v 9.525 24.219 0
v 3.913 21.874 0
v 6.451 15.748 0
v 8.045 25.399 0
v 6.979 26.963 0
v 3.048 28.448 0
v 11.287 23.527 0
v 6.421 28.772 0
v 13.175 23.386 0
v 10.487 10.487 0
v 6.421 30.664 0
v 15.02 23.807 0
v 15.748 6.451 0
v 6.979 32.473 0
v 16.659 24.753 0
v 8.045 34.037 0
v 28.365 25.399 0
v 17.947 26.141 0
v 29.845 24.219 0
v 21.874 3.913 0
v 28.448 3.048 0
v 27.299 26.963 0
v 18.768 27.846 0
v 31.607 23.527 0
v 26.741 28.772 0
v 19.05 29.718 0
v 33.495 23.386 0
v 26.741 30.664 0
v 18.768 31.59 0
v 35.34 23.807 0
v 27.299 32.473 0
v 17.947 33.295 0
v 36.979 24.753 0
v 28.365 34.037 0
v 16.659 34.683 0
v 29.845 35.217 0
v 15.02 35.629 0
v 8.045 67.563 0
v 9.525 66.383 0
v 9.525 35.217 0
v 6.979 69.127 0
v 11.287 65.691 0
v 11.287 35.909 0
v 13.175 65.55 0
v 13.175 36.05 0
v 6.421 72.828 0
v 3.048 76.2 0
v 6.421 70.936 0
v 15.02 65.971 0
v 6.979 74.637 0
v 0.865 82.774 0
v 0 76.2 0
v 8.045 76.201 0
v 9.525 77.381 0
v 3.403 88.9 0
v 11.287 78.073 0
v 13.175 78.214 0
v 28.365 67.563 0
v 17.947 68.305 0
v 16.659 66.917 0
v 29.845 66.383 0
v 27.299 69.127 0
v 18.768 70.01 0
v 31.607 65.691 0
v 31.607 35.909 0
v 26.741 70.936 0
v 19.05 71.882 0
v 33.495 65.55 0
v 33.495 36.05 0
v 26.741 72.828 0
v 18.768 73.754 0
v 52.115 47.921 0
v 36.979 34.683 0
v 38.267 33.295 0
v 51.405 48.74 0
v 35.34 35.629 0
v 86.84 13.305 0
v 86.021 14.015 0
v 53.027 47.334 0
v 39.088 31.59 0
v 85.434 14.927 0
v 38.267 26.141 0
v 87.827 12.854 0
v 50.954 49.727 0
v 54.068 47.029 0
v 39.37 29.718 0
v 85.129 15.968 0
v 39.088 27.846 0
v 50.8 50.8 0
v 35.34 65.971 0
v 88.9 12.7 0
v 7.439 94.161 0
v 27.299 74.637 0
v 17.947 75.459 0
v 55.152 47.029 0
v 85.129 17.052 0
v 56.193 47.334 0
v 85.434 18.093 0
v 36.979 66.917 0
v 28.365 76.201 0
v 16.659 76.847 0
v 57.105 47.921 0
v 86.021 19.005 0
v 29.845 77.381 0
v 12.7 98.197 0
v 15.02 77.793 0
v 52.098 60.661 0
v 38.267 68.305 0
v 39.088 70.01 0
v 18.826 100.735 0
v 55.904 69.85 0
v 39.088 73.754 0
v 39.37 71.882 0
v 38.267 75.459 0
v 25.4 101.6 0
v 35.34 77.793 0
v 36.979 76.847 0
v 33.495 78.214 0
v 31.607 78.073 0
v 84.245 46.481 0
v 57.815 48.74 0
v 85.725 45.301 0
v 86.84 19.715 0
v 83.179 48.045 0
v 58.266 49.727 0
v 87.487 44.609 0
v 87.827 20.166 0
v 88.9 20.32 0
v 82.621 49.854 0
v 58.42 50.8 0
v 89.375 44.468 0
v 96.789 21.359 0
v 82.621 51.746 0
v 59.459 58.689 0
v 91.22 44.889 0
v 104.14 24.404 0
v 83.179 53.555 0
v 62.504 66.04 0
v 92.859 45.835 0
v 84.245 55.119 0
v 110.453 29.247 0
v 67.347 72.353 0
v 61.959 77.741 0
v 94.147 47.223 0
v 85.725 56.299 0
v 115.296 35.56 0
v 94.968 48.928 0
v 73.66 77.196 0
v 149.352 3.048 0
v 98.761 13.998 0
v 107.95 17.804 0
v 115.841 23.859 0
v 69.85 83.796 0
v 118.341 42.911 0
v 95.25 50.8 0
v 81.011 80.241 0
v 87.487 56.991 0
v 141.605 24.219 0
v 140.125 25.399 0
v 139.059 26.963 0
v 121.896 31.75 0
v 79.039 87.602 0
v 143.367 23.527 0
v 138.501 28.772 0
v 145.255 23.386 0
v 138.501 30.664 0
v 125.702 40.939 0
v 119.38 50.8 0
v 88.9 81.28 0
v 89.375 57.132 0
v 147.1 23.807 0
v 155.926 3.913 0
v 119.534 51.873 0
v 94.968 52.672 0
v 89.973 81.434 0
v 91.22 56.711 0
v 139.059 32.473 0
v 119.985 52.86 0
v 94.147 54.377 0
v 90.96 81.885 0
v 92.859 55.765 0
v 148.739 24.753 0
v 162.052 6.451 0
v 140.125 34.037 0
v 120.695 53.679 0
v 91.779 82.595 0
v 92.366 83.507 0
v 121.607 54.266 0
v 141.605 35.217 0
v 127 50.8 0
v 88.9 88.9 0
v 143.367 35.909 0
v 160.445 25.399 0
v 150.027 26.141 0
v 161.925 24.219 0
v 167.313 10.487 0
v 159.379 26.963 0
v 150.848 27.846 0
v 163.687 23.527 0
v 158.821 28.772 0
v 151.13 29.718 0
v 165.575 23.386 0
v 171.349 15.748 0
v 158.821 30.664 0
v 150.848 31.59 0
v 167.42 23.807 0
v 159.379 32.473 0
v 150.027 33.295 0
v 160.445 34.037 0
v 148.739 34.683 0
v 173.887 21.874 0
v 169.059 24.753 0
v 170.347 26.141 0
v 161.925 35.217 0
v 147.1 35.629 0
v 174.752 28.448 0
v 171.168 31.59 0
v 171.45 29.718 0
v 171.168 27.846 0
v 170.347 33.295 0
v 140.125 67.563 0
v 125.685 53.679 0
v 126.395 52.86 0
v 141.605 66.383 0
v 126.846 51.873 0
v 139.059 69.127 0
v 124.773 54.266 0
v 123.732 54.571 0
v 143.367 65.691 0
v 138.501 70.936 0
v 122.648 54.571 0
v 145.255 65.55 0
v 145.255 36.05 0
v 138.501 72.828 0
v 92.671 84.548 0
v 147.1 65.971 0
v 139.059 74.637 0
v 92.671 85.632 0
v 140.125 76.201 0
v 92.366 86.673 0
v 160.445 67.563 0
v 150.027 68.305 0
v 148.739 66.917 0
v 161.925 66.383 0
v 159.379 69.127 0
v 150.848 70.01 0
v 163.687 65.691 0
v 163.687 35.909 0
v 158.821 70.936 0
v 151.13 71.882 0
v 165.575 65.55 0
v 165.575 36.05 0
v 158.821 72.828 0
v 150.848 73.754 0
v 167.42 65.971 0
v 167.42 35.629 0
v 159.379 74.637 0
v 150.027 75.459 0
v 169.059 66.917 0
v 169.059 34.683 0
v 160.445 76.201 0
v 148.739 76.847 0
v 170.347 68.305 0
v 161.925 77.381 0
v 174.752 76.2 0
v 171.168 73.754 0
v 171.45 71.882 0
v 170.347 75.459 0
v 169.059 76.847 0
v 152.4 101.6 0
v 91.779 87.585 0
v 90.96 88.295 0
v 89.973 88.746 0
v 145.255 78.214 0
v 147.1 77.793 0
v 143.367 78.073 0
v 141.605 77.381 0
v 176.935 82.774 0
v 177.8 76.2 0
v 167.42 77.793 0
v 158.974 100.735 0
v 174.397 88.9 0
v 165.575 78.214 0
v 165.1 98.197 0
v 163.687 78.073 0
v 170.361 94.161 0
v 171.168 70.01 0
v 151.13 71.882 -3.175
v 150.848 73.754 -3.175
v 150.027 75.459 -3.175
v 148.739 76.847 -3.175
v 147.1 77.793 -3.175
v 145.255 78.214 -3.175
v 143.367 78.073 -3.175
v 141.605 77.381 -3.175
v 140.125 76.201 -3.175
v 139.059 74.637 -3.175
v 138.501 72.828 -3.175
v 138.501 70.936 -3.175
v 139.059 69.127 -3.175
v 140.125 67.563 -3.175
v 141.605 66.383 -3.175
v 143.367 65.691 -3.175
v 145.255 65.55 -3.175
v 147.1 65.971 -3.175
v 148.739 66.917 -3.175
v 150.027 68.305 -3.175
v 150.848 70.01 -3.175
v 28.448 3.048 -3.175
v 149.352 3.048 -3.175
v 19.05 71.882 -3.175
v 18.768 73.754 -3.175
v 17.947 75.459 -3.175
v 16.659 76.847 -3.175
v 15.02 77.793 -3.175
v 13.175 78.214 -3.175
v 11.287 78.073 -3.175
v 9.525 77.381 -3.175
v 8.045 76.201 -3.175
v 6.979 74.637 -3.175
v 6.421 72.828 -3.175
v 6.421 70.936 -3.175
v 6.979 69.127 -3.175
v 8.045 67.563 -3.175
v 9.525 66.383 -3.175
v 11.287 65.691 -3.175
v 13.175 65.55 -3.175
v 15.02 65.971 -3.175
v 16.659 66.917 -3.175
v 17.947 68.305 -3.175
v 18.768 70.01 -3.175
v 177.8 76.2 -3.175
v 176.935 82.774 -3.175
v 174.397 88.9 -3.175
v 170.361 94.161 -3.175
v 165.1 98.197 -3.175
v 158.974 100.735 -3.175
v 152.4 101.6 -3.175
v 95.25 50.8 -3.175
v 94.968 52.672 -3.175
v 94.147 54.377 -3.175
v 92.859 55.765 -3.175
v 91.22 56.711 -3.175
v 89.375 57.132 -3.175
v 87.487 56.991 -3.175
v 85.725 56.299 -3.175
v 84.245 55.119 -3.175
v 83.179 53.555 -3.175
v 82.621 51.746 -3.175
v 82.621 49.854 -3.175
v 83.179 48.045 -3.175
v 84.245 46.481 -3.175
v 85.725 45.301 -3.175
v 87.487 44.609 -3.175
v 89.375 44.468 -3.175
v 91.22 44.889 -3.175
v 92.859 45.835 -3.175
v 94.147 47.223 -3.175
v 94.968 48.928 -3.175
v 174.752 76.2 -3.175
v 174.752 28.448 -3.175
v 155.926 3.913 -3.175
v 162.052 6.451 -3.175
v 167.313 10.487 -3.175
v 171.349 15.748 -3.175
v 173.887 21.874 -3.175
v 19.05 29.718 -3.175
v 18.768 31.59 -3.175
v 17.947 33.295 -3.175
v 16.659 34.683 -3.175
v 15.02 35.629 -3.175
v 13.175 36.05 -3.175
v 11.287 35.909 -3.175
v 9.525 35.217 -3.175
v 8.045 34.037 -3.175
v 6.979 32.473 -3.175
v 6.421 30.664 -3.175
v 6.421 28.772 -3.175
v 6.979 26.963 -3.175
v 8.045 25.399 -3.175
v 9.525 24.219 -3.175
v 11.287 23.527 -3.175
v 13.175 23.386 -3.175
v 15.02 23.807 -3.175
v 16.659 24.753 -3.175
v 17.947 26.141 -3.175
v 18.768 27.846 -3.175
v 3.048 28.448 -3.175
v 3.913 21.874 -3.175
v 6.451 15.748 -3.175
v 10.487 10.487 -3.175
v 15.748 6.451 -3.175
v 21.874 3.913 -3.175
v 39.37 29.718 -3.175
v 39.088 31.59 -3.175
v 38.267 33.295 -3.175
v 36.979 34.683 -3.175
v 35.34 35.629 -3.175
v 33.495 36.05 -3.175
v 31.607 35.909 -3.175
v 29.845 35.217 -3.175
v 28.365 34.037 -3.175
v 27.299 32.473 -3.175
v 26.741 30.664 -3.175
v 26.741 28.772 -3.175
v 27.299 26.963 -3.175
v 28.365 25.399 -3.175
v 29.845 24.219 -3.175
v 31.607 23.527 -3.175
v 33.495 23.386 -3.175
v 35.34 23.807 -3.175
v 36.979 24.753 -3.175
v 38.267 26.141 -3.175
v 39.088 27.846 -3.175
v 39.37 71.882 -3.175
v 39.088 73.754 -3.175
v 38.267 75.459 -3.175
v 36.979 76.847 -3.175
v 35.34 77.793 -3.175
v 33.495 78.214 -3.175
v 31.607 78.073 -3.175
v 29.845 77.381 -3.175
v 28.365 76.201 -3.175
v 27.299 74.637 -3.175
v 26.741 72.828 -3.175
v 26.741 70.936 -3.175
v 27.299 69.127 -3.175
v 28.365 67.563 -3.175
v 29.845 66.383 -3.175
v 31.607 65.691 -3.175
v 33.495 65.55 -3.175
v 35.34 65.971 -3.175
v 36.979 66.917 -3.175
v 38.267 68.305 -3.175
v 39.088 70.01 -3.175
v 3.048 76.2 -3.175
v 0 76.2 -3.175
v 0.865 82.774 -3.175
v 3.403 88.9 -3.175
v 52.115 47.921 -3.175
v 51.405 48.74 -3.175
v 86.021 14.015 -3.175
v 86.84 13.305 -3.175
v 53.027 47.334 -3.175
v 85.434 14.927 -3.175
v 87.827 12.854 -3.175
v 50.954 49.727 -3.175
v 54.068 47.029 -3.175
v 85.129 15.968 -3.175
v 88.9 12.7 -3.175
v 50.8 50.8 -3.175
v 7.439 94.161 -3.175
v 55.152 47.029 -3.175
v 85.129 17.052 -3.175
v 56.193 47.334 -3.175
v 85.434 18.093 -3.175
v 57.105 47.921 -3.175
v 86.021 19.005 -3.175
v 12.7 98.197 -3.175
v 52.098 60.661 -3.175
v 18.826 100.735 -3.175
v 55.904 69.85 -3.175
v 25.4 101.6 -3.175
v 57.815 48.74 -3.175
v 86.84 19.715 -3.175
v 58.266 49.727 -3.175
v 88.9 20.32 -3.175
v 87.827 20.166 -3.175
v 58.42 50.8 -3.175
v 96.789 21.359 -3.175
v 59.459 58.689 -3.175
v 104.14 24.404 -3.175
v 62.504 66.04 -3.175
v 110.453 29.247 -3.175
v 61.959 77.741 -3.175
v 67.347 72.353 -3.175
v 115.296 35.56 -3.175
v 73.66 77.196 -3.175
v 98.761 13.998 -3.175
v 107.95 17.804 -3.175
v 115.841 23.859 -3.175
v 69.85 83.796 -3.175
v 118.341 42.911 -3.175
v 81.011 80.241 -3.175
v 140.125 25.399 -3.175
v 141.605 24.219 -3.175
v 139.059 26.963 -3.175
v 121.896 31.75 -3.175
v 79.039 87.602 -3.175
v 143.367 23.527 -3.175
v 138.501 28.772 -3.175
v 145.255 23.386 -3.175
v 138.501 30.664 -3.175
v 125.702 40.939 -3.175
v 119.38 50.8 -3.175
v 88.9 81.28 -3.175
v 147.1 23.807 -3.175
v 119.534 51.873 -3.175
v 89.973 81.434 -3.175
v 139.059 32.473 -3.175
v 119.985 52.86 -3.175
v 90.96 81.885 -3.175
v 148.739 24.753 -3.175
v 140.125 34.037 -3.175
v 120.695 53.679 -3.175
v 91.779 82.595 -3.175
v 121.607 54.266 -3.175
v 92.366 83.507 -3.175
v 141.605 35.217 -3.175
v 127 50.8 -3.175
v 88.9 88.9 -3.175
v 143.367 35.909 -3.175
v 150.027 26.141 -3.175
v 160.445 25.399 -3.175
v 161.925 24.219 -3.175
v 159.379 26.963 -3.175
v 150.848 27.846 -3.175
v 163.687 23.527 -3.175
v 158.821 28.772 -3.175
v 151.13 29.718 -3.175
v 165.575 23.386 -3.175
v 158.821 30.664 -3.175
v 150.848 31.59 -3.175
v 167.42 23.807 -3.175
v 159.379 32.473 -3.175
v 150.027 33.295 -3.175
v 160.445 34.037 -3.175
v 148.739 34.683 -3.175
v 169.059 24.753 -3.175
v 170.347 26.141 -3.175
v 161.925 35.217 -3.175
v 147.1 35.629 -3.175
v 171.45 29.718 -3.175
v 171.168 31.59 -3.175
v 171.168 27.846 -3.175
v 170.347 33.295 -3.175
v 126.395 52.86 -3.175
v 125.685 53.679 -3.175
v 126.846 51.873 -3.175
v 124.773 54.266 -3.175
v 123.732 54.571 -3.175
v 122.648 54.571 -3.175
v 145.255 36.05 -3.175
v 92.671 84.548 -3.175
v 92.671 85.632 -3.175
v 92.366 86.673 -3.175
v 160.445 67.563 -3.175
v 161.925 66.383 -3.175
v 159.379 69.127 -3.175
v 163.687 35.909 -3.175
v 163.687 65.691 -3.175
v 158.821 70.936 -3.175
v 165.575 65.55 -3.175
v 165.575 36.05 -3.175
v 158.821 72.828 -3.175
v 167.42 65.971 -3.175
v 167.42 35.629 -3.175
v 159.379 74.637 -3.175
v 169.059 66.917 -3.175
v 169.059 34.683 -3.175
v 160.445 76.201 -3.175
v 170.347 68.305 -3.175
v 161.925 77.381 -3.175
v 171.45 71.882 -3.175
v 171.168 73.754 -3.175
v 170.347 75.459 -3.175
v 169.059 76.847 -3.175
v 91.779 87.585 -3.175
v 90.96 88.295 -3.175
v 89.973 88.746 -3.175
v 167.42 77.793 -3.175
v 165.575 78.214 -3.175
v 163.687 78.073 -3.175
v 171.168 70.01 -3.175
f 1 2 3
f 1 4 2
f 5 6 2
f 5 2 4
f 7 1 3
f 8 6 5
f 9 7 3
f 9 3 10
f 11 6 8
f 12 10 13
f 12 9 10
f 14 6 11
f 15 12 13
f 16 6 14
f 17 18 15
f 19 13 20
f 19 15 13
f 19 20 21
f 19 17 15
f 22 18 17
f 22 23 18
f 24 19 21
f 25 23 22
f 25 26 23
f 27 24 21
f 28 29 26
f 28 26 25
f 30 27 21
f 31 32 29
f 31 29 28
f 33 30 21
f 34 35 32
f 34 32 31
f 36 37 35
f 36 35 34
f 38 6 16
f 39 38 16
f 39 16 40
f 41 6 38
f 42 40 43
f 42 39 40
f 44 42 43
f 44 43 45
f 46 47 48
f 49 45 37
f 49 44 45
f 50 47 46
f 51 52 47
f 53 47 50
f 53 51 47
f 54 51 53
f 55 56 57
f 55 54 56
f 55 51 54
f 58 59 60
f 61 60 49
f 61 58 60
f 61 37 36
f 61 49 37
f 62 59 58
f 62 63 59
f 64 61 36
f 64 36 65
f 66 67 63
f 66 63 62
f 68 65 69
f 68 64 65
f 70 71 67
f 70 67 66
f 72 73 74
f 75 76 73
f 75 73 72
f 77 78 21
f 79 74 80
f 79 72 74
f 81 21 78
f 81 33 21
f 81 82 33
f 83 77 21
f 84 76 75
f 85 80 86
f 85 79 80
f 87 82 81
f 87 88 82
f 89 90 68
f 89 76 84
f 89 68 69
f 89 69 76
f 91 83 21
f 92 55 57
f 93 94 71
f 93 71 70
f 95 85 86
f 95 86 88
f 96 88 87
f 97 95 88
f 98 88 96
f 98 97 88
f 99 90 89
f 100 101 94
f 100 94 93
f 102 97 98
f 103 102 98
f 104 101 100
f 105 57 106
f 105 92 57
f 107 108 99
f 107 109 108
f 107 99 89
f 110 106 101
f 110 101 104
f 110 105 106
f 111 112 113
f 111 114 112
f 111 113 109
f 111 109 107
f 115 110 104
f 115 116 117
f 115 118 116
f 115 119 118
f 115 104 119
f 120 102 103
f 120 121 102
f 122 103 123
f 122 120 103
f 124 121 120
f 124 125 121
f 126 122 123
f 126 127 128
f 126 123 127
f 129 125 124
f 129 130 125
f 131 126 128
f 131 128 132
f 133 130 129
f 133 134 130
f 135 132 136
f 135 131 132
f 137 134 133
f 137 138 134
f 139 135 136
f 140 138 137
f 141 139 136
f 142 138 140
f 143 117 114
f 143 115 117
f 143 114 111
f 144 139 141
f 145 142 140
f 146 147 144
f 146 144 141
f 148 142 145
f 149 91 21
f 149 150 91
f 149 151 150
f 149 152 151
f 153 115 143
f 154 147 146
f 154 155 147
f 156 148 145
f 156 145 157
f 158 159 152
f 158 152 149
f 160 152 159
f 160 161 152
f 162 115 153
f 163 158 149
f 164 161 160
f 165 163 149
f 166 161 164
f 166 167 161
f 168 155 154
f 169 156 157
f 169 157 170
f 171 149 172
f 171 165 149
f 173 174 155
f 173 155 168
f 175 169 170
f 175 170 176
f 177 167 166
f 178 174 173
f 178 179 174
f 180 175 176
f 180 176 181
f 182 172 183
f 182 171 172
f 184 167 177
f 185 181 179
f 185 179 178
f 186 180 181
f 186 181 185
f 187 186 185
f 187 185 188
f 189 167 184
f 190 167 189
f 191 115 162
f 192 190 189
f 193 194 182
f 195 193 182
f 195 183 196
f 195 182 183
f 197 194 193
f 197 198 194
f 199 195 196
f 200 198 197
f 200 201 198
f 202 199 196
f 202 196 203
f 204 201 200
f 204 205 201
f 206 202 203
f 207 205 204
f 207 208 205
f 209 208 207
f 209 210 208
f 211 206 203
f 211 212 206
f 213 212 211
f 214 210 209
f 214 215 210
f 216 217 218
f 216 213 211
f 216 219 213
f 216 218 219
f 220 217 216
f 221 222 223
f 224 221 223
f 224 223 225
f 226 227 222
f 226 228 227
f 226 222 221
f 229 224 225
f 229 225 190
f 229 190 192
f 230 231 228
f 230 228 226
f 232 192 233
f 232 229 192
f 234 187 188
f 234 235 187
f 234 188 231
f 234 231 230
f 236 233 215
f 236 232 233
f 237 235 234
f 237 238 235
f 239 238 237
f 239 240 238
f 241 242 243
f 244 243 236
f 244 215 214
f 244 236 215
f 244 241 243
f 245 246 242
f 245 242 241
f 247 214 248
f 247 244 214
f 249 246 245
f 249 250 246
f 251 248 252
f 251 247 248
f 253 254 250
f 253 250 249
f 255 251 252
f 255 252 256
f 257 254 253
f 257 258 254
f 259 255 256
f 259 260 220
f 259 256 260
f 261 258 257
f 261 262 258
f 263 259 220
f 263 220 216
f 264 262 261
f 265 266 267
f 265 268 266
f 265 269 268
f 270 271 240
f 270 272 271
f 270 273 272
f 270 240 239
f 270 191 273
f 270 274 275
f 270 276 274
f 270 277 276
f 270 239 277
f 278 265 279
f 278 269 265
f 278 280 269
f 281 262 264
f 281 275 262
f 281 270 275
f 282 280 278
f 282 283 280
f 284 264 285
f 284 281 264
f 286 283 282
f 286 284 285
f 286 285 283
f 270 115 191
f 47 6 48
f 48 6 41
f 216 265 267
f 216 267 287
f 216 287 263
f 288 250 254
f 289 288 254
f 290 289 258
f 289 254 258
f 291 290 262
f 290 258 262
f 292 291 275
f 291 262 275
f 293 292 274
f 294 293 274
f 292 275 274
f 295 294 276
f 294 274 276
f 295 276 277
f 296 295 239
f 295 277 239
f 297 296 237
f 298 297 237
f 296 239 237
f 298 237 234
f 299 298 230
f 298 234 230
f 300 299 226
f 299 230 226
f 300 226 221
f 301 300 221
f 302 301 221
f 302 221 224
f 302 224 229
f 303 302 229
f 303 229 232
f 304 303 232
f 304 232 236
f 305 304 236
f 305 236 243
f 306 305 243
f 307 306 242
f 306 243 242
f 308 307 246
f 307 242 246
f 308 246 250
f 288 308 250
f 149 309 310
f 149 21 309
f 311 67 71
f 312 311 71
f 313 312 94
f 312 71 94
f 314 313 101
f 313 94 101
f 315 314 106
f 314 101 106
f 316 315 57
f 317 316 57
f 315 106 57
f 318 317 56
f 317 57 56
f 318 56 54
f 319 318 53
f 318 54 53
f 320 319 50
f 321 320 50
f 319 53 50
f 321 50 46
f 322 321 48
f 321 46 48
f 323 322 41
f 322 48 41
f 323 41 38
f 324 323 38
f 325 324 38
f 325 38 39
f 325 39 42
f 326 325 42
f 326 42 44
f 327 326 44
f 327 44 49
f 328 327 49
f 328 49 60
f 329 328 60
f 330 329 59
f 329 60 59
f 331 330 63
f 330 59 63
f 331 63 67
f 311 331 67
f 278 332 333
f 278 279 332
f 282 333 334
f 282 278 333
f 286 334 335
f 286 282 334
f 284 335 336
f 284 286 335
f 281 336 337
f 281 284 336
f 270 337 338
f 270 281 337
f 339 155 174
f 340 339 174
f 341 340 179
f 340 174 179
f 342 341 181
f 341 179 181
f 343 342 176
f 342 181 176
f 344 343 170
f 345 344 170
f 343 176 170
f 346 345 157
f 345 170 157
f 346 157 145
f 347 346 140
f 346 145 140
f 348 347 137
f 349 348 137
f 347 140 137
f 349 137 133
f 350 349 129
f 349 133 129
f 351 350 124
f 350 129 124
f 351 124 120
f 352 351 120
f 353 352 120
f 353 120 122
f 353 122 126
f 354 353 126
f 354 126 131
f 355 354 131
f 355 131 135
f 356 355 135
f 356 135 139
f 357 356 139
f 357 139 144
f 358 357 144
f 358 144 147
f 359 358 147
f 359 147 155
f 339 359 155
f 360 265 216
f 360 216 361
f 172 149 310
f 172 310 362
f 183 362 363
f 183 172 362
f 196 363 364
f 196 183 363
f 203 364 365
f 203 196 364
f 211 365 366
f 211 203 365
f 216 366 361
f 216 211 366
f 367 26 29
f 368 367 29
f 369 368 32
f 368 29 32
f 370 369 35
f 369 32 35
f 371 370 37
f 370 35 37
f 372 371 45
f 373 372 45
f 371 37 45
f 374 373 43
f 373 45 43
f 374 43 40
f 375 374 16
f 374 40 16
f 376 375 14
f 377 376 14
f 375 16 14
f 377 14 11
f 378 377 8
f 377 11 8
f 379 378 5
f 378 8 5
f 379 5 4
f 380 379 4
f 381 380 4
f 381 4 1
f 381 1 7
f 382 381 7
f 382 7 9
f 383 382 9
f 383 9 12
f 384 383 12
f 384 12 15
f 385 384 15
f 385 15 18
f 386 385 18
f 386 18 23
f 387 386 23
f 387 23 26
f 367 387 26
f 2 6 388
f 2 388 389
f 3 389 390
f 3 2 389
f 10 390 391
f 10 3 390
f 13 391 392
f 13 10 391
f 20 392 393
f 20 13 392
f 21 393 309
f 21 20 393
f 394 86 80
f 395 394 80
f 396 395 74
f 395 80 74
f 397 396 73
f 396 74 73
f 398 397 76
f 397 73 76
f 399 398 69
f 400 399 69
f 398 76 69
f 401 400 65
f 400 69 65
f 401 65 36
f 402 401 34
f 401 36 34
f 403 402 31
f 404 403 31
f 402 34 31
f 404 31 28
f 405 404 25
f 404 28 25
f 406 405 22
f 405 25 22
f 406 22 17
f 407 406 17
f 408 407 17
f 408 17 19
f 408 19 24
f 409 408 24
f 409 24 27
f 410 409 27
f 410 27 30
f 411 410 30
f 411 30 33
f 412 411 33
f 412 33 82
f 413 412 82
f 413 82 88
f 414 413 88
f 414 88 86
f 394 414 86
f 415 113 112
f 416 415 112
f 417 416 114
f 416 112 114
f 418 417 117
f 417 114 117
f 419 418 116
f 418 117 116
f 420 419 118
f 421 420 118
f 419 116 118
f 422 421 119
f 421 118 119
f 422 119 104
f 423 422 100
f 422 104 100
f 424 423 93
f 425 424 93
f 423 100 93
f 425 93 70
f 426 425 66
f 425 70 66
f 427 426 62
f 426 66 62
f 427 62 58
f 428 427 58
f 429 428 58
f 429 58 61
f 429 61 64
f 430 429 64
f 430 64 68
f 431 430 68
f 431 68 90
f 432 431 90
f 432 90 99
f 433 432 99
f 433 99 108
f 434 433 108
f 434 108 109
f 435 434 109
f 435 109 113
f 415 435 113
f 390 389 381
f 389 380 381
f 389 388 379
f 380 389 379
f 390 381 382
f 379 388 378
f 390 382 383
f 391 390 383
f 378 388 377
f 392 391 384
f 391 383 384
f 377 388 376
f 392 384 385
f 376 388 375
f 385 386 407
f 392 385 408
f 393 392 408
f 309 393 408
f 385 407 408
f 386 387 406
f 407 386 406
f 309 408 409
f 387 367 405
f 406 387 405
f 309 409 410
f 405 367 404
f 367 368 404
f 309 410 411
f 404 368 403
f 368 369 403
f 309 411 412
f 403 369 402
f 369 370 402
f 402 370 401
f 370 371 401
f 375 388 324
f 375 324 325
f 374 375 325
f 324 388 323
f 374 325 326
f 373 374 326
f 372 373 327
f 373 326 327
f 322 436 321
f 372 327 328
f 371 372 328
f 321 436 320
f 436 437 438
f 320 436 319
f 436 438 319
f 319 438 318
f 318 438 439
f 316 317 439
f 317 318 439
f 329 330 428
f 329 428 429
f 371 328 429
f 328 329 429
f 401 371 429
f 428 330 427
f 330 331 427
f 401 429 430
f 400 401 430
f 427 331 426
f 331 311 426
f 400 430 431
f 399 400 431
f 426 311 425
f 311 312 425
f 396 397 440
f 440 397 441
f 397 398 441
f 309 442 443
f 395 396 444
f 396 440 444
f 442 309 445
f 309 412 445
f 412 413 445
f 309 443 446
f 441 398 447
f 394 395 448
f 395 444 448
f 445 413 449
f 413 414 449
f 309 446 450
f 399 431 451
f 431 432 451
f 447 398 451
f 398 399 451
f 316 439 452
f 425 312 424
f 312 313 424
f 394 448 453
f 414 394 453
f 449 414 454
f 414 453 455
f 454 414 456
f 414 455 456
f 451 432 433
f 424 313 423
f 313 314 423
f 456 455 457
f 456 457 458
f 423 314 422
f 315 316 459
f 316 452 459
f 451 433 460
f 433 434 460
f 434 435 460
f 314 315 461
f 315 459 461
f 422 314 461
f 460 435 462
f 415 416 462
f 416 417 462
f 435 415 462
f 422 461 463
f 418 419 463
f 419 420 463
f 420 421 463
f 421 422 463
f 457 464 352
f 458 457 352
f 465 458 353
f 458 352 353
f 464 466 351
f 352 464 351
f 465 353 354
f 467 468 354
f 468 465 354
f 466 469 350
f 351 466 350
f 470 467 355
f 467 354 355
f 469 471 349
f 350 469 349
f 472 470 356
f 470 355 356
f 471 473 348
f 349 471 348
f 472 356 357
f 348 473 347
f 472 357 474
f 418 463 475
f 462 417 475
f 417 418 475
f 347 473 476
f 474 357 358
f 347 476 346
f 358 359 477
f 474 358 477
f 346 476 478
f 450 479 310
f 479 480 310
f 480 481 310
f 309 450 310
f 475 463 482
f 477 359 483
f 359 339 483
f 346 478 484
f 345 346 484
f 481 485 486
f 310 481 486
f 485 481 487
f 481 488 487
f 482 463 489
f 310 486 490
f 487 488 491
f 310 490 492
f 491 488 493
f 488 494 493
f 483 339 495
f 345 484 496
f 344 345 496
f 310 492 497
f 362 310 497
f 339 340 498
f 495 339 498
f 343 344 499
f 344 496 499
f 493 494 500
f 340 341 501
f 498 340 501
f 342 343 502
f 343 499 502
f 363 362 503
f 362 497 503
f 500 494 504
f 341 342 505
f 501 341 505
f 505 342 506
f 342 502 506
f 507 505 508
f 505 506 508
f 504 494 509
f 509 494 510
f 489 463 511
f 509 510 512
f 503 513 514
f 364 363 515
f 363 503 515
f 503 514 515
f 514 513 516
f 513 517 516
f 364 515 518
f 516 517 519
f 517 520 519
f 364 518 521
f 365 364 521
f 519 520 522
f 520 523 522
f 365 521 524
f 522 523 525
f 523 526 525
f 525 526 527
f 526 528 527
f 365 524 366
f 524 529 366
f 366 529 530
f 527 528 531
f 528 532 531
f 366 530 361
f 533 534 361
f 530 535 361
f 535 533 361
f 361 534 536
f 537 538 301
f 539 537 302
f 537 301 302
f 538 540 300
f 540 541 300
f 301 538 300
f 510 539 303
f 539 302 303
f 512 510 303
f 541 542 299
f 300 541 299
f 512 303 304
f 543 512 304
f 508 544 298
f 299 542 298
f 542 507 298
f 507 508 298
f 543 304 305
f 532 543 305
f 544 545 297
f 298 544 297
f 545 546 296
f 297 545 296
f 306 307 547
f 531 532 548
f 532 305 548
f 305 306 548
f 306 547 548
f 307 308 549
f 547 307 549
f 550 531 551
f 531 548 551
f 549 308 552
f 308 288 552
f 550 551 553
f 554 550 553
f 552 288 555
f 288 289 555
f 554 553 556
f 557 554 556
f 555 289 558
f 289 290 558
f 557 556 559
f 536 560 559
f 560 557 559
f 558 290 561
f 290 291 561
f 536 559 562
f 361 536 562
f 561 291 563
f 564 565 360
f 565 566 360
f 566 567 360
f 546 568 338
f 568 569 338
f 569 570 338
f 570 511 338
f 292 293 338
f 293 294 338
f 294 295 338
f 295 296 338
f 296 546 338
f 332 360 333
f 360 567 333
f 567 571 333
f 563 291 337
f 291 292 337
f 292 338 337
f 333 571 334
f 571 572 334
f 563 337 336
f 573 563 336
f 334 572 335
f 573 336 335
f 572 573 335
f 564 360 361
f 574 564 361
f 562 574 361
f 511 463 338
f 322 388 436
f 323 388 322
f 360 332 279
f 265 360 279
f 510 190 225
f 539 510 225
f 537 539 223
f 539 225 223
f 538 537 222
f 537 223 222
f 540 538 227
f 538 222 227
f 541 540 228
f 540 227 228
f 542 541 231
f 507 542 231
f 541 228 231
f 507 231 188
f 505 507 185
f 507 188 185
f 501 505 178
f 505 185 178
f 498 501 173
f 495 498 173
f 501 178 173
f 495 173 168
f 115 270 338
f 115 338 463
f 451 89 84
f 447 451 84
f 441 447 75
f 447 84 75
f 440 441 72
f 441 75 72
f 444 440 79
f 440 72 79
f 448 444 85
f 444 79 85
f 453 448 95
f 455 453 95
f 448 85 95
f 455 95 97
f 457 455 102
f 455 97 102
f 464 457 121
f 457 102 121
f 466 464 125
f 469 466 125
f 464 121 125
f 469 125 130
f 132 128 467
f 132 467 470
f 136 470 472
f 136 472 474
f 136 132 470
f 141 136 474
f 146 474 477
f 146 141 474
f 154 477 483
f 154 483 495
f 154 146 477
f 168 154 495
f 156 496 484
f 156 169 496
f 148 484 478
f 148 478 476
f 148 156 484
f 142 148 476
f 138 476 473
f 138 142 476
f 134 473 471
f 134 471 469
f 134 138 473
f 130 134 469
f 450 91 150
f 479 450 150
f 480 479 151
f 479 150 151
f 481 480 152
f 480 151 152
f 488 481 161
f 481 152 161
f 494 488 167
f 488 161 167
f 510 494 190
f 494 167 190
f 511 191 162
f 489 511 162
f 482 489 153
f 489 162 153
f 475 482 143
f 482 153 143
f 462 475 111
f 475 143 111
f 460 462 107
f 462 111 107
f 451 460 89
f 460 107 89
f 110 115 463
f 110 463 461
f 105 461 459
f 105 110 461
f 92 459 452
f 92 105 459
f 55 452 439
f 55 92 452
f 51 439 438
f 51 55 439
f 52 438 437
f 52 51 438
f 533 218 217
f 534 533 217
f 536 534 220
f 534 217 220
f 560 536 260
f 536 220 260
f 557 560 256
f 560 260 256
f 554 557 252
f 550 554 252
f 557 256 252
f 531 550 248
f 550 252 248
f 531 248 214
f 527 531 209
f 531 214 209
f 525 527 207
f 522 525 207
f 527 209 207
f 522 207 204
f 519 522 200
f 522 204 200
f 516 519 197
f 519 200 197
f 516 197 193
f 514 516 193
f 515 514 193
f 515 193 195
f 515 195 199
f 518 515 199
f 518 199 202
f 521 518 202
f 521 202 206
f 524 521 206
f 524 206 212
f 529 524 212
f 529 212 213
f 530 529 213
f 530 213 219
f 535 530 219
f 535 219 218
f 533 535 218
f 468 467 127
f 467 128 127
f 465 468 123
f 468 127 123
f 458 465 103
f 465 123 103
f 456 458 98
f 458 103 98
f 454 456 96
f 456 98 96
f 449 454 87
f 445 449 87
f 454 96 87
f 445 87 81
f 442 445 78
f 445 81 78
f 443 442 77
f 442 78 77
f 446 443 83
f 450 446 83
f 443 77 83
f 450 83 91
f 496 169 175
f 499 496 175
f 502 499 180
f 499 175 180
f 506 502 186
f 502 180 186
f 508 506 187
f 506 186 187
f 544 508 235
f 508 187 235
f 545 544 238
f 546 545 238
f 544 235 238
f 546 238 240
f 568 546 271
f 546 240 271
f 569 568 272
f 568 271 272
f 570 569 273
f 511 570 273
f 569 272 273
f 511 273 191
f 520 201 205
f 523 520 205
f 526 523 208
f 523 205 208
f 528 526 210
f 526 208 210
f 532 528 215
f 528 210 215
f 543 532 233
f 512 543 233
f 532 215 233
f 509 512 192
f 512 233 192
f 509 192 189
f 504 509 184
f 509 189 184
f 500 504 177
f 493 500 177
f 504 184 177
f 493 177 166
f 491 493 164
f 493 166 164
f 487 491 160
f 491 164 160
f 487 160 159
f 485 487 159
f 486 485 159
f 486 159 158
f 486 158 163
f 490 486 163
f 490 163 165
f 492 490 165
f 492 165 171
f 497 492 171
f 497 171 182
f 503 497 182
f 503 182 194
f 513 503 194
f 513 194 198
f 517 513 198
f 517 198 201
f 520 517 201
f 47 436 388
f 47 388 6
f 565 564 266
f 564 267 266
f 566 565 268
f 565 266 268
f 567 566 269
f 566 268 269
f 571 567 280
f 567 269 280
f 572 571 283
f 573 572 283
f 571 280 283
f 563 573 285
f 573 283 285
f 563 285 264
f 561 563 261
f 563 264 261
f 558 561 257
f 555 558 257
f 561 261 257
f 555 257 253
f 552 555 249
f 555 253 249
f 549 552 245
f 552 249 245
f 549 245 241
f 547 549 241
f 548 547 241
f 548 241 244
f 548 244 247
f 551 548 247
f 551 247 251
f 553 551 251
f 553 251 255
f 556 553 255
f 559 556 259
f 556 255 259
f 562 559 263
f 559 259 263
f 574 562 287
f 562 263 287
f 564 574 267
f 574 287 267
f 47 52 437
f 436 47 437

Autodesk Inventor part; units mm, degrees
ref_plane "YZ Plane" through (0, 0, 0) normal (1, 0, 0) x (0, 1, 0)
sketch "Sketch3" plane through (0, 0, 0) normal (0, 0, 1) x (1, 0, 0)
  line L0 (0, 0) -> (177.8, 0)
  line L1 (177.8, 0) -> (177.8, 101.6)
  line L2 (177.8, 101.6) -> (0, 101.6)
  line L3 (0, 101.6) -> (0, 0)
  arc A0 (25.4, 101.6) -> (0, 76.2) centre (25.4, 76.2) ccw
  arc A1 (177.8, 76.2) -> (152.4, 101.6) centre (152.4, 76.2) ccw
  arc A2 (152.4, 0) -> (177.8, 25.4) centre (152.4, 25.4) ccw
  arc A3 (0, 25.4) -> (25.4, 0) centre (25.4, 25.4) ccw
  circle A4 centre (88.9, 50.8) radius 6.35
  arc A5 (88.9, 85.09) -> (54.61, 50.8) centre (88.9, 50.8) ccw construction
  arc A6 (88.9, 88.9) -> (50.8, 50.8) centre (88.9, 50.8) ccw
  arc A7 (88.9, 81.28) -> (58.42, 50.8) centre (88.9, 50.8) ccw
  arc A8 (88.9, 81.28) -> (88.9, 88.9) centre (88.9, 85.09) ccw
  arc A9 (50.8, 50.8) -> (58.42, 50.8) centre (54.61, 50.8) ccw
  line L4 (88.9, 50.8) -> (54.61, 50.8) construction
  line L5 (88.9, 50.8) -> (88.9, 85.09) construction
  arc A10 (88.9, 20.32) -> (119.38, 50.8) centre (88.9, 50.8) ccw
  line L6 (88.9, 50.8) -> (123.19, 50.8) construction
  arc A11 (88.9, 16.51) -> (123.19, 50.8) centre (88.9, 50.8) ccw construction
  arc A12 (127, 50.8) -> (119.38, 50.8) centre (123.19, 50.8) ccw
  arc A13 (88.9, 12.7) -> (127, 50.8) centre (88.9, 50.8) ccw
  arc A14 (88.9, 20.32) -> (88.9, 12.7) centre (88.9, 16.51) ccw
  dimension "d20" = 177.8
  dimension "d21" = 101.6
  dimension "d22" = 50.8
  dimension "d23" = 50.8
  dimension "d24" = 50.8
  dimension "d25" = 50.8
  dimension "d26" = 12.7
  dimension "d27" = 50.8
  dimension "d28" = 88.9
  dimension "d29" = 34.29
  dimension "d30" = 90
  dimension "d31" = 7.62
  dimension "d34" = 360
extrude "Extrusion3" add sketch "Sketch3" against normal blind 3.175 contours A3 L3 A0 L2 A1 L1 A2 L0
ref_plane "Work Plane1" through (25.4, 50.8, 0) normal (0, 1, 0) x (1, 0, 0)
sketch "Sketch4" plane through (0, 0, 0) normal (0, 0, 1) x (1, 0, 0)
  line L0 (0, 76.2) -> (0, 25.4) projected
  line L1 (0, 50.8) -> (177.8, 50.8)
  line L2 (177.8, 76.2) -> (177.8, 25.4) projected
  line L3 (152.4, 101.6) -> (25.4, 101.6) projected
  line L4 (88.9, 101.6) -> (88.9, 0)
  circle A0 centre (12.7, 71.882) radius 6.35
  circle A1 centre (33.02, 71.882) radius 6.35
  line L5 (0, 25.4) -> (0, 76.2)
  circle A2 centre (12.7, 29.718) radius 6.35
  circle A3 centre (33.02, 29.718) radius 6.35
  circle A4 centre (165.1, 71.882) radius 6.35
  circle A5 centre (144.78, 71.882) radius 6.35
  circle A6 centre (165.1, 29.718) radius 6.35
  circle A7 centre (144.78, 29.718) radius 6.35
  point P0 (0, 0)
  dimension "d39" = 12.7
  dimension "d40" = 12.7
  dimension "d41" = 20.32
  dimension "d42" = 12.7
  dimension "d43" = 21.082
extrude "Extrusion4" cut sketch "Sketch4" against normal blind 25.4
sketch "Sketch5" plane through (177.8, 25.4, 0) normal (1, 0, 0) x (0, 0, -1)
  line L0 (3.175, 50.8) -> (3.175, 76.2) projected
  line L1 (0, -25.4) -> (3.175, -25.4)
  line L2 (3.175, -25.4) -> (3.175, 50.8)
  line L3 (3.175, 50.8) -> (0, 50.8)
  line L4 (0, 50.8) -> (0, -25.4)
extrude "Extrusion5" cut sketch "Sketch5" against normal blind 3.048
sketch "Sketch6" plane through (0, 25.4, 0) normal (-1, 0, 0) x (0, 0, 1)
  line L0 (0, 50.8) -> (-3.175, 50.8) projected
  line L1 (-3.175, 50.8) -> (0, 50.8)
  line L2 (0, 50.8) -> (0, -25.4)
  line L3 (0, -25.4) -> (-3.175, -25.4)
  line L4 (-3.175, -25.4) -> (-3.175, 50.8)
extrude "Extrusion6" cut sketch "Sketch6" against normal blind 3.048
sketch "Sketch7" plane through (25.4, 0, 0) normal (0, -1, 0) x (1, 0, 0)
  line L0 (-22.352, -3.175) -> (-22.352, 0) projected
  line L1 (127, -3.175) -> (152.4, -3.175) projected
  line L2 (-22.352, 0) -> (149.352, 0)
  line L3 (149.352, 0) -> (149.352, -3.175)
  line L4 (149.352, -3.175) -> (-22.352, -3.175)
  line L5 (-22.352, -3.175) -> (-22.352, 0)
  point P0 (-25.4, 0)
  point P1 (149.352, -1.5875)
  dimension "d50" = 171.704
extrude "Extrusion7" cut sketch "Sketch7" against normal blind 3.048
sketch "Sketch8" plane through (0, 0, 0) normal (0, 0, 1) x (1, 0, 0)
  arc A0 (3.048, 28.448) -> (28.448, 3.048) centre (28.448, 28.448) ccw
  arc A1 (149.352, 3.048) -> (174.752, 28.448) centre (149.352, 28.448) ccw
  line L0 (174.752, 13.3357) -> (174.752, 76.2) projected
  line L1 (13.3357, 3.048) -> (164.4643, 3.048) projected
  line L2 (3.048, 76.2) -> (3.048, 13.3357) projected
  line L3 (3.048, 28.448) -> (3.048, 3.048)
  line L4 (3.048, 3.048) -> (28.448, 3.048)
  line L5 (174.752, 28.448) -> (174.752, 3.048)
  line L6 (174.752, 3.048) -> (149.352, 3.048)
  point P0 (0, 0)
  point P1 (3.048, 13.3357)
  dimension "d53" = 50.8
  dimension "d54" = 50.8
extrude "Extrusion8" cut sketch "Sketch8" against normal through all
ref_plane "Work Plane2" through (174.752, 25.4, 0) normal (1, 0, 0) x (0, 0, -1)
properties part number "Plate"
